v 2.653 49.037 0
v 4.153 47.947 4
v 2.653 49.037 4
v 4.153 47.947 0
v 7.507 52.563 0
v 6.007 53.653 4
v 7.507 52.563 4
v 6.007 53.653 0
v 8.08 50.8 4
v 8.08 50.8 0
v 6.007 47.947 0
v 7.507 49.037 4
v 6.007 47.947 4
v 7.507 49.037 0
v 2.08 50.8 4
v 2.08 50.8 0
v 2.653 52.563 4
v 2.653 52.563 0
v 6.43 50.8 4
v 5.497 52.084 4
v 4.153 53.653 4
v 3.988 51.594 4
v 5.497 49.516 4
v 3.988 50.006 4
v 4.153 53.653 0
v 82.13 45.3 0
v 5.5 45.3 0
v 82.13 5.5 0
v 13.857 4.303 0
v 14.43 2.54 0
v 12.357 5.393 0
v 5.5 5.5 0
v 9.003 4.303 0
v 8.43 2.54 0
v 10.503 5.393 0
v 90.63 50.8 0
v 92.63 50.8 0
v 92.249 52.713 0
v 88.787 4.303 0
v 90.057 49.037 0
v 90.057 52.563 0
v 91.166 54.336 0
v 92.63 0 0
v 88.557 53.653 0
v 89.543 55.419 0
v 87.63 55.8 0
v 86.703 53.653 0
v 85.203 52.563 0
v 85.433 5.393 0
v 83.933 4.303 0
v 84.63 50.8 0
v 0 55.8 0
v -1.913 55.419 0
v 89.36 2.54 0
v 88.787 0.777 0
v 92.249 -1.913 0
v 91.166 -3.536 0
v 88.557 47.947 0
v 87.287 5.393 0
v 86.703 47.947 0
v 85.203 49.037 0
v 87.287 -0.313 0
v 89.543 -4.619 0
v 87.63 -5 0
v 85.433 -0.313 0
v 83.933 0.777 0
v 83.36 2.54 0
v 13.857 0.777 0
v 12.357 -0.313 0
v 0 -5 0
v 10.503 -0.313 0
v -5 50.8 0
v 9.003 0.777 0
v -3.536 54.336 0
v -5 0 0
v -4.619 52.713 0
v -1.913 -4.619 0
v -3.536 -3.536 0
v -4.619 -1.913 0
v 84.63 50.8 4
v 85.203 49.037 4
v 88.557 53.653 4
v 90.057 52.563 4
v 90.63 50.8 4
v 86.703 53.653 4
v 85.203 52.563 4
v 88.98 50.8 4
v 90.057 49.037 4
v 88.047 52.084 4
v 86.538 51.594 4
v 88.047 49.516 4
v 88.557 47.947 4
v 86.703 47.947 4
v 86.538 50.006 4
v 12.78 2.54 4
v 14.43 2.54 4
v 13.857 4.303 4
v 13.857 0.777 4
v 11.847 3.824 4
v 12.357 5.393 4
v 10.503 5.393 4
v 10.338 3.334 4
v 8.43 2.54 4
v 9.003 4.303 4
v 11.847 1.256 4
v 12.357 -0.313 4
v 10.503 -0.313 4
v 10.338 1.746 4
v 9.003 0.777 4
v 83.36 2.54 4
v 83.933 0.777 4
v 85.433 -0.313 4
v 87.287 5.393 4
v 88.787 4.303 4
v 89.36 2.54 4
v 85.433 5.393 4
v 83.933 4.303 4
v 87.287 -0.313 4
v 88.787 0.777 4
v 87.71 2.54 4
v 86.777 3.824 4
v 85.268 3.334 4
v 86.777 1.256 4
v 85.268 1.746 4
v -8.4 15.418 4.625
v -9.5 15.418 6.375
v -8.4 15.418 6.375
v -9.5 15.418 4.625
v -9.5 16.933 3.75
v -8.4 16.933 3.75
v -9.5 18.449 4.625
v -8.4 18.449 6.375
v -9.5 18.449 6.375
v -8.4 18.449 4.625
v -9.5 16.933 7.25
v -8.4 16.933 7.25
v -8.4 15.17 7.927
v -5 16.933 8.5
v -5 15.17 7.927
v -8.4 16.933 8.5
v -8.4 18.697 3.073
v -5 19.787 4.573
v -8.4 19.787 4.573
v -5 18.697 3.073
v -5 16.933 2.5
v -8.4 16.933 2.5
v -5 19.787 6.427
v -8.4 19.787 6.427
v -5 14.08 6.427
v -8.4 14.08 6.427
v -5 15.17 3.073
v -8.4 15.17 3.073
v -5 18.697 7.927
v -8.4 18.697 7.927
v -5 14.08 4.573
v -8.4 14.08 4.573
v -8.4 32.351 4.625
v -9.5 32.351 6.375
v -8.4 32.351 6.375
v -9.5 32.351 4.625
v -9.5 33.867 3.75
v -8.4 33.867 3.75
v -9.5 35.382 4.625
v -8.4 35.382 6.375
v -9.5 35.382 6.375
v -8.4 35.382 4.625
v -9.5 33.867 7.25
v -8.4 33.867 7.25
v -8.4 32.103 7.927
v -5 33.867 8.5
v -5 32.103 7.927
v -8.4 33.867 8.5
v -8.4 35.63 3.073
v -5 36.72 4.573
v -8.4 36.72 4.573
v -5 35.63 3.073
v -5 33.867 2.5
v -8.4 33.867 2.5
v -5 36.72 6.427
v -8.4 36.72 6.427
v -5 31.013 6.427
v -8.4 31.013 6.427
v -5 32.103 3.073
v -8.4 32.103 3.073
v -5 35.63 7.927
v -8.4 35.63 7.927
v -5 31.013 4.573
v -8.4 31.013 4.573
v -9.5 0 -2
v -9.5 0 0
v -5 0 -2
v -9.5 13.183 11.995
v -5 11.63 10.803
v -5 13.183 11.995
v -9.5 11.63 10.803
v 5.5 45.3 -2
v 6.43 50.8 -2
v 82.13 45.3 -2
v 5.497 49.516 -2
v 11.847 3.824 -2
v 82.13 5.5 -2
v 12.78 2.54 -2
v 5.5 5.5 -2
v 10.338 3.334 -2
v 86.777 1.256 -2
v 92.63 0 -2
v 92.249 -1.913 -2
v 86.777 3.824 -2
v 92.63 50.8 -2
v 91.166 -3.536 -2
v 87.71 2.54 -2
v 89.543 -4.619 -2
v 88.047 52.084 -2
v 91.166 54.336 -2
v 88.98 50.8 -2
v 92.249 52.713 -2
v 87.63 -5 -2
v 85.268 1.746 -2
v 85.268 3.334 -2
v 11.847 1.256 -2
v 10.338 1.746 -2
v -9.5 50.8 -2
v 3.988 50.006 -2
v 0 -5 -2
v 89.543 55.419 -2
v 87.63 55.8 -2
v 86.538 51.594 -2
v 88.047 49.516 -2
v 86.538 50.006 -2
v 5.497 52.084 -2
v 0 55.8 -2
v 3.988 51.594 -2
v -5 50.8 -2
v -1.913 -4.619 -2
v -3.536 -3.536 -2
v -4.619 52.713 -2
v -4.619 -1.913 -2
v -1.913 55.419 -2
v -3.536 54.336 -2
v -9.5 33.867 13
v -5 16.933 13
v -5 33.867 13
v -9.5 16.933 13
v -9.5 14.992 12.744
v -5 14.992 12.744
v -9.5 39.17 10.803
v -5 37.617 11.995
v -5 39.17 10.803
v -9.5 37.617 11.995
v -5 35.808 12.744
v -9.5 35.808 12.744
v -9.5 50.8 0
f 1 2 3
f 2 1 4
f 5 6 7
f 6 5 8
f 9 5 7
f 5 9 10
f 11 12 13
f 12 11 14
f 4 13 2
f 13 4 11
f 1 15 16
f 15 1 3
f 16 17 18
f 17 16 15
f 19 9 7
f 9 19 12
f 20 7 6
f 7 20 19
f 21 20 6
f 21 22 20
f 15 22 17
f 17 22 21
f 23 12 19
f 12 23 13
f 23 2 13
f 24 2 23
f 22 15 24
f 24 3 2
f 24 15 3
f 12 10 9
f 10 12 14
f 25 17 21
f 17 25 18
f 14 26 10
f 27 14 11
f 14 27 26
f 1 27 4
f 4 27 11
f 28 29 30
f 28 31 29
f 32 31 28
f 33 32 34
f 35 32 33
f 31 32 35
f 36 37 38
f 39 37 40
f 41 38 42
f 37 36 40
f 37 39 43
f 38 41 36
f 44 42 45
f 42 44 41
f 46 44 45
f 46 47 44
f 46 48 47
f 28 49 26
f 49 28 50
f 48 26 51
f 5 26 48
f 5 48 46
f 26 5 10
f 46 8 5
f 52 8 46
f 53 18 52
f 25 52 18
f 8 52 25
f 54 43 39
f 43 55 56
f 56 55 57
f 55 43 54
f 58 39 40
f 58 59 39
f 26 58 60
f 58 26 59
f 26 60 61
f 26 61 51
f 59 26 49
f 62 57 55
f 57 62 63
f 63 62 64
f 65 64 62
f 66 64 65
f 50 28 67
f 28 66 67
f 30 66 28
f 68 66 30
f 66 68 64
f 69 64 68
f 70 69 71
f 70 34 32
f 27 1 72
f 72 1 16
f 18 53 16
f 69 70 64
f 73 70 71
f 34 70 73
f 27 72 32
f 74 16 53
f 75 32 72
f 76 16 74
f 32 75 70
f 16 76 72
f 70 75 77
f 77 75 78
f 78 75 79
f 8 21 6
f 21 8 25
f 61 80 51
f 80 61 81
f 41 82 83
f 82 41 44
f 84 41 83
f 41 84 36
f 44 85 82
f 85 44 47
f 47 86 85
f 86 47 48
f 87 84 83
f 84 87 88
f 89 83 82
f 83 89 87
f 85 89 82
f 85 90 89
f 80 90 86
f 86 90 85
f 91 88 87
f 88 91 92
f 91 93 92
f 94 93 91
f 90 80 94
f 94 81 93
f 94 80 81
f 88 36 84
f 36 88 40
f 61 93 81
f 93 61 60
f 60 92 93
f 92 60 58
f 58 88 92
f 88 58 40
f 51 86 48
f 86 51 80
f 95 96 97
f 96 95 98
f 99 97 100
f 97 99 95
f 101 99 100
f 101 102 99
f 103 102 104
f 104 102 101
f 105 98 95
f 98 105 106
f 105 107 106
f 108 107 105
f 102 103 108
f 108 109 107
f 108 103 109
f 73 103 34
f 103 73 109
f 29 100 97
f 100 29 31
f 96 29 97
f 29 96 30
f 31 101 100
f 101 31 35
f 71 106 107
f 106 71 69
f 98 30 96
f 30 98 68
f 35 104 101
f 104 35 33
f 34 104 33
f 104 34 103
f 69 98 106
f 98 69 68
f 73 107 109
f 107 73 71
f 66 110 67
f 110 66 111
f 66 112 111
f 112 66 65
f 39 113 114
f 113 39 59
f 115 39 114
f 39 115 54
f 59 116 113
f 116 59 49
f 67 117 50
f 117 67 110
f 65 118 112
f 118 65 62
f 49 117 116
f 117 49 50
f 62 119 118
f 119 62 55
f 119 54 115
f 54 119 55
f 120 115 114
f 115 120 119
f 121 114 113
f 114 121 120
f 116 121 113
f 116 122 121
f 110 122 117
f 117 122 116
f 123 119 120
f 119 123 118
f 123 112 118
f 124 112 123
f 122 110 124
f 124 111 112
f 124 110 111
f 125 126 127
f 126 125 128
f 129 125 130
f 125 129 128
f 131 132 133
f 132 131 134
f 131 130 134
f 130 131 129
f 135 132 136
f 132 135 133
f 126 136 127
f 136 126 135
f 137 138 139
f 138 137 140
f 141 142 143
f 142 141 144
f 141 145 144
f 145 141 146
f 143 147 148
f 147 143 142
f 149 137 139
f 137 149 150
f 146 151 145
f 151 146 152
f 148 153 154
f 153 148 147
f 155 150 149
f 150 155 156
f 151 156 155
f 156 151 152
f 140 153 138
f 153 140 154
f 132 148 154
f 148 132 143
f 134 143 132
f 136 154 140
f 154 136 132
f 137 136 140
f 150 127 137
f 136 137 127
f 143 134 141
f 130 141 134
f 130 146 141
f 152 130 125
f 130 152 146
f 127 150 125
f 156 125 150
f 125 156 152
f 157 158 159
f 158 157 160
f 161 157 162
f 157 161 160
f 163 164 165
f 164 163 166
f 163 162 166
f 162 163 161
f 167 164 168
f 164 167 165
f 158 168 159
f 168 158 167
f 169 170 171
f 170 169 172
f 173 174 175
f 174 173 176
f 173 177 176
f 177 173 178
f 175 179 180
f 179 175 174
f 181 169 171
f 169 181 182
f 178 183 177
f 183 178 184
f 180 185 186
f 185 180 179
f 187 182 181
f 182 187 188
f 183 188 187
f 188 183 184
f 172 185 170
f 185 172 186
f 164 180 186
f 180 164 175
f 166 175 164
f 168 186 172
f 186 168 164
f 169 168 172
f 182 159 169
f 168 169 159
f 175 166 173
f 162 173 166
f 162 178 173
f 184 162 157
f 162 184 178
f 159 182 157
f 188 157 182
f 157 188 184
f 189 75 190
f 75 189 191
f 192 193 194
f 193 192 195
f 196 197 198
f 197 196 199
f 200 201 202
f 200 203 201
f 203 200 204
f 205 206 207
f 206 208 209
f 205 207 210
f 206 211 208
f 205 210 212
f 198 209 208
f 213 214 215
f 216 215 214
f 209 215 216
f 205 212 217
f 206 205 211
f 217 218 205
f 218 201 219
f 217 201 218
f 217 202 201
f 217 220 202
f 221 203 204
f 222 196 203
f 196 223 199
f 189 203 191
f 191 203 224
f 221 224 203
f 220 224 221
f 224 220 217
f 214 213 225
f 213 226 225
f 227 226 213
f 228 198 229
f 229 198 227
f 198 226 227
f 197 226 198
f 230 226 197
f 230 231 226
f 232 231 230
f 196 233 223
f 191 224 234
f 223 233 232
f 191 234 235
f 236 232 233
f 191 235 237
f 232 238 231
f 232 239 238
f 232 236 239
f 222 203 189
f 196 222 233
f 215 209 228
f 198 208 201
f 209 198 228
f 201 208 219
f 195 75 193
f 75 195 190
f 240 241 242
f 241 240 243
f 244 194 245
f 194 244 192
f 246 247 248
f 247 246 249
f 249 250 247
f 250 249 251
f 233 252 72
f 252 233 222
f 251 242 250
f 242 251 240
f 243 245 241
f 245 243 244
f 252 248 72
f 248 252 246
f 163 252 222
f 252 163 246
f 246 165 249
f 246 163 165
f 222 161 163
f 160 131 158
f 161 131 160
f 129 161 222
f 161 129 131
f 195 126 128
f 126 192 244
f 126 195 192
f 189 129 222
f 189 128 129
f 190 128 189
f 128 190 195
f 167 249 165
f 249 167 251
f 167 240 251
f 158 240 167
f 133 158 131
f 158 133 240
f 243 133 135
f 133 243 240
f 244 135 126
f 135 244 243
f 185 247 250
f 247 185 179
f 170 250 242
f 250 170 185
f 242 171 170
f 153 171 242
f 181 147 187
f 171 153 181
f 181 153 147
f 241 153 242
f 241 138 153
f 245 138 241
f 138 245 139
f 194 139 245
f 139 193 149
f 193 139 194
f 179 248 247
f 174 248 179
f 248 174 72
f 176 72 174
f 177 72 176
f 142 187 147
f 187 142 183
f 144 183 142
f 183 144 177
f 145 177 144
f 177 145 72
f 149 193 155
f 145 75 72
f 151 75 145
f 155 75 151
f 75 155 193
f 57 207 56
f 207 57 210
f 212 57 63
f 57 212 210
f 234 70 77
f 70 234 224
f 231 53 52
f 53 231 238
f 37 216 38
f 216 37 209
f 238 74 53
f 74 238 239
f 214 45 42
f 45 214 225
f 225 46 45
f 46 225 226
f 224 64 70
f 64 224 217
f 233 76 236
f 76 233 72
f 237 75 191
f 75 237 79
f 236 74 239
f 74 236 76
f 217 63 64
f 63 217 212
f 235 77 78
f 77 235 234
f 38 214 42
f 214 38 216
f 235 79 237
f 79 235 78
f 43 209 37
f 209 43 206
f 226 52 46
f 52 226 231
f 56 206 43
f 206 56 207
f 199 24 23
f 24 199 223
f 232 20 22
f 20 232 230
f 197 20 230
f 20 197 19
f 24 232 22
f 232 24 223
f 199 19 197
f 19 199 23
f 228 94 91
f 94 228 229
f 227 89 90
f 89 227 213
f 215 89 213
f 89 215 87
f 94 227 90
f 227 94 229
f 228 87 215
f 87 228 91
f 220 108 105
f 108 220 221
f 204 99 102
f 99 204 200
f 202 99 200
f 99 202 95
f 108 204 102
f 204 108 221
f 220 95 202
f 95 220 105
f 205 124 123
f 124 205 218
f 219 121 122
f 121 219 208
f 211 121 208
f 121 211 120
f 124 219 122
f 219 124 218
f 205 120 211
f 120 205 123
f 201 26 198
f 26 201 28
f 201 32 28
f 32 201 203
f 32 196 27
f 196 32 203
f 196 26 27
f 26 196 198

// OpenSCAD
sh=4; //stub height
sd=6; //stub outer diameter
sid= 2.7;//stub inned diameter
od=5; //outer distance
br=5; //braket radius
id=-5.5; //inner distance
m3i=15; //M3 in (from the sides)
bh=4.5;   // bracket height
bbh=2;   //bottom bracket height

// holes position
hp = [
    [5.08,50.8],
    [87.63,50.8],
    [11.43,2.54],
    [86.36,2.54],
];
    
    module roundedCube(d,r){
    hull(){
    translate([+r,+r,0]) cylinder(r=r,h=d[2]);
    translate([d[0]-r,+r,0]) cylinder(r=r,h=d[2]);
    translate([+r,d[1]-r,0]) cylinder(r=r,h=d[2]);
    translate([d[0]-r,d[1]-r,0]) cylinder(r=r,h=d[2]);
    }
    }
module hexM3screw (h){
   cylinder(d=3.5,h=h);
    translate([0,0,h-3.5])
        cylinder(d=6,h=3.5);
} 

module backet (S){
    holepos=[1/3,2/3];
    difference(){
        //cube(S);
        hull(){
            for (i = holepos){
                translate([0,S[1]*i,S[2]/2]) rotate([0,90,0])
                  cylinder(d=S[2],h=S[0]);
            }
            for (i=[0,S[1]-1]){
                translate ([0,i,0]) cube([S[0],1,bbh]);
            }
        }
        //bracet Holes
        for (i = holepos)  {
            translate([-1,S[1]*i,S[2]/2]) 
                rotate([0,90,0]) hexM3screw(h=S[0]+1.1);
        }
    }
}
    
module boardHull(hp, h, d=0,r=0){
    maxx = max([for (i=hp) i[0]]);
    maxy = max([for (i=hp) i[1]]);
    linear_extrude(height=h) 
        offset(r=r) offset(delta=d) 
            square([maxx,maxy]);
}
    
%translate([0,0,sh])boardHull(hp,1.5,r=3.5);
maxy = max([for (i=hp) i[1]]);
difference(){
    union(){
        translate([0,0,-bbh])
            boardHull(hp,bbh,od-br,br);
        for (p=hp){
            translate([p[0],p[1],0]) cylinder(d=sd,h=sh);
        }
        translate([-od-bh,-od+br,-bbh]) 
        backet([bh,maxy+od*2-2*br,m3i]);
    }
    // open bottom
    translate([0,0,-bbh-1])
        boardHull(hp,bbh+2,r=id);
    //passthrough holes
    for (p=hp){
        translate([p[0],p[1],-bbh-1]) cylinder(d=sid,h=sh+bbh+2);
    }
}
